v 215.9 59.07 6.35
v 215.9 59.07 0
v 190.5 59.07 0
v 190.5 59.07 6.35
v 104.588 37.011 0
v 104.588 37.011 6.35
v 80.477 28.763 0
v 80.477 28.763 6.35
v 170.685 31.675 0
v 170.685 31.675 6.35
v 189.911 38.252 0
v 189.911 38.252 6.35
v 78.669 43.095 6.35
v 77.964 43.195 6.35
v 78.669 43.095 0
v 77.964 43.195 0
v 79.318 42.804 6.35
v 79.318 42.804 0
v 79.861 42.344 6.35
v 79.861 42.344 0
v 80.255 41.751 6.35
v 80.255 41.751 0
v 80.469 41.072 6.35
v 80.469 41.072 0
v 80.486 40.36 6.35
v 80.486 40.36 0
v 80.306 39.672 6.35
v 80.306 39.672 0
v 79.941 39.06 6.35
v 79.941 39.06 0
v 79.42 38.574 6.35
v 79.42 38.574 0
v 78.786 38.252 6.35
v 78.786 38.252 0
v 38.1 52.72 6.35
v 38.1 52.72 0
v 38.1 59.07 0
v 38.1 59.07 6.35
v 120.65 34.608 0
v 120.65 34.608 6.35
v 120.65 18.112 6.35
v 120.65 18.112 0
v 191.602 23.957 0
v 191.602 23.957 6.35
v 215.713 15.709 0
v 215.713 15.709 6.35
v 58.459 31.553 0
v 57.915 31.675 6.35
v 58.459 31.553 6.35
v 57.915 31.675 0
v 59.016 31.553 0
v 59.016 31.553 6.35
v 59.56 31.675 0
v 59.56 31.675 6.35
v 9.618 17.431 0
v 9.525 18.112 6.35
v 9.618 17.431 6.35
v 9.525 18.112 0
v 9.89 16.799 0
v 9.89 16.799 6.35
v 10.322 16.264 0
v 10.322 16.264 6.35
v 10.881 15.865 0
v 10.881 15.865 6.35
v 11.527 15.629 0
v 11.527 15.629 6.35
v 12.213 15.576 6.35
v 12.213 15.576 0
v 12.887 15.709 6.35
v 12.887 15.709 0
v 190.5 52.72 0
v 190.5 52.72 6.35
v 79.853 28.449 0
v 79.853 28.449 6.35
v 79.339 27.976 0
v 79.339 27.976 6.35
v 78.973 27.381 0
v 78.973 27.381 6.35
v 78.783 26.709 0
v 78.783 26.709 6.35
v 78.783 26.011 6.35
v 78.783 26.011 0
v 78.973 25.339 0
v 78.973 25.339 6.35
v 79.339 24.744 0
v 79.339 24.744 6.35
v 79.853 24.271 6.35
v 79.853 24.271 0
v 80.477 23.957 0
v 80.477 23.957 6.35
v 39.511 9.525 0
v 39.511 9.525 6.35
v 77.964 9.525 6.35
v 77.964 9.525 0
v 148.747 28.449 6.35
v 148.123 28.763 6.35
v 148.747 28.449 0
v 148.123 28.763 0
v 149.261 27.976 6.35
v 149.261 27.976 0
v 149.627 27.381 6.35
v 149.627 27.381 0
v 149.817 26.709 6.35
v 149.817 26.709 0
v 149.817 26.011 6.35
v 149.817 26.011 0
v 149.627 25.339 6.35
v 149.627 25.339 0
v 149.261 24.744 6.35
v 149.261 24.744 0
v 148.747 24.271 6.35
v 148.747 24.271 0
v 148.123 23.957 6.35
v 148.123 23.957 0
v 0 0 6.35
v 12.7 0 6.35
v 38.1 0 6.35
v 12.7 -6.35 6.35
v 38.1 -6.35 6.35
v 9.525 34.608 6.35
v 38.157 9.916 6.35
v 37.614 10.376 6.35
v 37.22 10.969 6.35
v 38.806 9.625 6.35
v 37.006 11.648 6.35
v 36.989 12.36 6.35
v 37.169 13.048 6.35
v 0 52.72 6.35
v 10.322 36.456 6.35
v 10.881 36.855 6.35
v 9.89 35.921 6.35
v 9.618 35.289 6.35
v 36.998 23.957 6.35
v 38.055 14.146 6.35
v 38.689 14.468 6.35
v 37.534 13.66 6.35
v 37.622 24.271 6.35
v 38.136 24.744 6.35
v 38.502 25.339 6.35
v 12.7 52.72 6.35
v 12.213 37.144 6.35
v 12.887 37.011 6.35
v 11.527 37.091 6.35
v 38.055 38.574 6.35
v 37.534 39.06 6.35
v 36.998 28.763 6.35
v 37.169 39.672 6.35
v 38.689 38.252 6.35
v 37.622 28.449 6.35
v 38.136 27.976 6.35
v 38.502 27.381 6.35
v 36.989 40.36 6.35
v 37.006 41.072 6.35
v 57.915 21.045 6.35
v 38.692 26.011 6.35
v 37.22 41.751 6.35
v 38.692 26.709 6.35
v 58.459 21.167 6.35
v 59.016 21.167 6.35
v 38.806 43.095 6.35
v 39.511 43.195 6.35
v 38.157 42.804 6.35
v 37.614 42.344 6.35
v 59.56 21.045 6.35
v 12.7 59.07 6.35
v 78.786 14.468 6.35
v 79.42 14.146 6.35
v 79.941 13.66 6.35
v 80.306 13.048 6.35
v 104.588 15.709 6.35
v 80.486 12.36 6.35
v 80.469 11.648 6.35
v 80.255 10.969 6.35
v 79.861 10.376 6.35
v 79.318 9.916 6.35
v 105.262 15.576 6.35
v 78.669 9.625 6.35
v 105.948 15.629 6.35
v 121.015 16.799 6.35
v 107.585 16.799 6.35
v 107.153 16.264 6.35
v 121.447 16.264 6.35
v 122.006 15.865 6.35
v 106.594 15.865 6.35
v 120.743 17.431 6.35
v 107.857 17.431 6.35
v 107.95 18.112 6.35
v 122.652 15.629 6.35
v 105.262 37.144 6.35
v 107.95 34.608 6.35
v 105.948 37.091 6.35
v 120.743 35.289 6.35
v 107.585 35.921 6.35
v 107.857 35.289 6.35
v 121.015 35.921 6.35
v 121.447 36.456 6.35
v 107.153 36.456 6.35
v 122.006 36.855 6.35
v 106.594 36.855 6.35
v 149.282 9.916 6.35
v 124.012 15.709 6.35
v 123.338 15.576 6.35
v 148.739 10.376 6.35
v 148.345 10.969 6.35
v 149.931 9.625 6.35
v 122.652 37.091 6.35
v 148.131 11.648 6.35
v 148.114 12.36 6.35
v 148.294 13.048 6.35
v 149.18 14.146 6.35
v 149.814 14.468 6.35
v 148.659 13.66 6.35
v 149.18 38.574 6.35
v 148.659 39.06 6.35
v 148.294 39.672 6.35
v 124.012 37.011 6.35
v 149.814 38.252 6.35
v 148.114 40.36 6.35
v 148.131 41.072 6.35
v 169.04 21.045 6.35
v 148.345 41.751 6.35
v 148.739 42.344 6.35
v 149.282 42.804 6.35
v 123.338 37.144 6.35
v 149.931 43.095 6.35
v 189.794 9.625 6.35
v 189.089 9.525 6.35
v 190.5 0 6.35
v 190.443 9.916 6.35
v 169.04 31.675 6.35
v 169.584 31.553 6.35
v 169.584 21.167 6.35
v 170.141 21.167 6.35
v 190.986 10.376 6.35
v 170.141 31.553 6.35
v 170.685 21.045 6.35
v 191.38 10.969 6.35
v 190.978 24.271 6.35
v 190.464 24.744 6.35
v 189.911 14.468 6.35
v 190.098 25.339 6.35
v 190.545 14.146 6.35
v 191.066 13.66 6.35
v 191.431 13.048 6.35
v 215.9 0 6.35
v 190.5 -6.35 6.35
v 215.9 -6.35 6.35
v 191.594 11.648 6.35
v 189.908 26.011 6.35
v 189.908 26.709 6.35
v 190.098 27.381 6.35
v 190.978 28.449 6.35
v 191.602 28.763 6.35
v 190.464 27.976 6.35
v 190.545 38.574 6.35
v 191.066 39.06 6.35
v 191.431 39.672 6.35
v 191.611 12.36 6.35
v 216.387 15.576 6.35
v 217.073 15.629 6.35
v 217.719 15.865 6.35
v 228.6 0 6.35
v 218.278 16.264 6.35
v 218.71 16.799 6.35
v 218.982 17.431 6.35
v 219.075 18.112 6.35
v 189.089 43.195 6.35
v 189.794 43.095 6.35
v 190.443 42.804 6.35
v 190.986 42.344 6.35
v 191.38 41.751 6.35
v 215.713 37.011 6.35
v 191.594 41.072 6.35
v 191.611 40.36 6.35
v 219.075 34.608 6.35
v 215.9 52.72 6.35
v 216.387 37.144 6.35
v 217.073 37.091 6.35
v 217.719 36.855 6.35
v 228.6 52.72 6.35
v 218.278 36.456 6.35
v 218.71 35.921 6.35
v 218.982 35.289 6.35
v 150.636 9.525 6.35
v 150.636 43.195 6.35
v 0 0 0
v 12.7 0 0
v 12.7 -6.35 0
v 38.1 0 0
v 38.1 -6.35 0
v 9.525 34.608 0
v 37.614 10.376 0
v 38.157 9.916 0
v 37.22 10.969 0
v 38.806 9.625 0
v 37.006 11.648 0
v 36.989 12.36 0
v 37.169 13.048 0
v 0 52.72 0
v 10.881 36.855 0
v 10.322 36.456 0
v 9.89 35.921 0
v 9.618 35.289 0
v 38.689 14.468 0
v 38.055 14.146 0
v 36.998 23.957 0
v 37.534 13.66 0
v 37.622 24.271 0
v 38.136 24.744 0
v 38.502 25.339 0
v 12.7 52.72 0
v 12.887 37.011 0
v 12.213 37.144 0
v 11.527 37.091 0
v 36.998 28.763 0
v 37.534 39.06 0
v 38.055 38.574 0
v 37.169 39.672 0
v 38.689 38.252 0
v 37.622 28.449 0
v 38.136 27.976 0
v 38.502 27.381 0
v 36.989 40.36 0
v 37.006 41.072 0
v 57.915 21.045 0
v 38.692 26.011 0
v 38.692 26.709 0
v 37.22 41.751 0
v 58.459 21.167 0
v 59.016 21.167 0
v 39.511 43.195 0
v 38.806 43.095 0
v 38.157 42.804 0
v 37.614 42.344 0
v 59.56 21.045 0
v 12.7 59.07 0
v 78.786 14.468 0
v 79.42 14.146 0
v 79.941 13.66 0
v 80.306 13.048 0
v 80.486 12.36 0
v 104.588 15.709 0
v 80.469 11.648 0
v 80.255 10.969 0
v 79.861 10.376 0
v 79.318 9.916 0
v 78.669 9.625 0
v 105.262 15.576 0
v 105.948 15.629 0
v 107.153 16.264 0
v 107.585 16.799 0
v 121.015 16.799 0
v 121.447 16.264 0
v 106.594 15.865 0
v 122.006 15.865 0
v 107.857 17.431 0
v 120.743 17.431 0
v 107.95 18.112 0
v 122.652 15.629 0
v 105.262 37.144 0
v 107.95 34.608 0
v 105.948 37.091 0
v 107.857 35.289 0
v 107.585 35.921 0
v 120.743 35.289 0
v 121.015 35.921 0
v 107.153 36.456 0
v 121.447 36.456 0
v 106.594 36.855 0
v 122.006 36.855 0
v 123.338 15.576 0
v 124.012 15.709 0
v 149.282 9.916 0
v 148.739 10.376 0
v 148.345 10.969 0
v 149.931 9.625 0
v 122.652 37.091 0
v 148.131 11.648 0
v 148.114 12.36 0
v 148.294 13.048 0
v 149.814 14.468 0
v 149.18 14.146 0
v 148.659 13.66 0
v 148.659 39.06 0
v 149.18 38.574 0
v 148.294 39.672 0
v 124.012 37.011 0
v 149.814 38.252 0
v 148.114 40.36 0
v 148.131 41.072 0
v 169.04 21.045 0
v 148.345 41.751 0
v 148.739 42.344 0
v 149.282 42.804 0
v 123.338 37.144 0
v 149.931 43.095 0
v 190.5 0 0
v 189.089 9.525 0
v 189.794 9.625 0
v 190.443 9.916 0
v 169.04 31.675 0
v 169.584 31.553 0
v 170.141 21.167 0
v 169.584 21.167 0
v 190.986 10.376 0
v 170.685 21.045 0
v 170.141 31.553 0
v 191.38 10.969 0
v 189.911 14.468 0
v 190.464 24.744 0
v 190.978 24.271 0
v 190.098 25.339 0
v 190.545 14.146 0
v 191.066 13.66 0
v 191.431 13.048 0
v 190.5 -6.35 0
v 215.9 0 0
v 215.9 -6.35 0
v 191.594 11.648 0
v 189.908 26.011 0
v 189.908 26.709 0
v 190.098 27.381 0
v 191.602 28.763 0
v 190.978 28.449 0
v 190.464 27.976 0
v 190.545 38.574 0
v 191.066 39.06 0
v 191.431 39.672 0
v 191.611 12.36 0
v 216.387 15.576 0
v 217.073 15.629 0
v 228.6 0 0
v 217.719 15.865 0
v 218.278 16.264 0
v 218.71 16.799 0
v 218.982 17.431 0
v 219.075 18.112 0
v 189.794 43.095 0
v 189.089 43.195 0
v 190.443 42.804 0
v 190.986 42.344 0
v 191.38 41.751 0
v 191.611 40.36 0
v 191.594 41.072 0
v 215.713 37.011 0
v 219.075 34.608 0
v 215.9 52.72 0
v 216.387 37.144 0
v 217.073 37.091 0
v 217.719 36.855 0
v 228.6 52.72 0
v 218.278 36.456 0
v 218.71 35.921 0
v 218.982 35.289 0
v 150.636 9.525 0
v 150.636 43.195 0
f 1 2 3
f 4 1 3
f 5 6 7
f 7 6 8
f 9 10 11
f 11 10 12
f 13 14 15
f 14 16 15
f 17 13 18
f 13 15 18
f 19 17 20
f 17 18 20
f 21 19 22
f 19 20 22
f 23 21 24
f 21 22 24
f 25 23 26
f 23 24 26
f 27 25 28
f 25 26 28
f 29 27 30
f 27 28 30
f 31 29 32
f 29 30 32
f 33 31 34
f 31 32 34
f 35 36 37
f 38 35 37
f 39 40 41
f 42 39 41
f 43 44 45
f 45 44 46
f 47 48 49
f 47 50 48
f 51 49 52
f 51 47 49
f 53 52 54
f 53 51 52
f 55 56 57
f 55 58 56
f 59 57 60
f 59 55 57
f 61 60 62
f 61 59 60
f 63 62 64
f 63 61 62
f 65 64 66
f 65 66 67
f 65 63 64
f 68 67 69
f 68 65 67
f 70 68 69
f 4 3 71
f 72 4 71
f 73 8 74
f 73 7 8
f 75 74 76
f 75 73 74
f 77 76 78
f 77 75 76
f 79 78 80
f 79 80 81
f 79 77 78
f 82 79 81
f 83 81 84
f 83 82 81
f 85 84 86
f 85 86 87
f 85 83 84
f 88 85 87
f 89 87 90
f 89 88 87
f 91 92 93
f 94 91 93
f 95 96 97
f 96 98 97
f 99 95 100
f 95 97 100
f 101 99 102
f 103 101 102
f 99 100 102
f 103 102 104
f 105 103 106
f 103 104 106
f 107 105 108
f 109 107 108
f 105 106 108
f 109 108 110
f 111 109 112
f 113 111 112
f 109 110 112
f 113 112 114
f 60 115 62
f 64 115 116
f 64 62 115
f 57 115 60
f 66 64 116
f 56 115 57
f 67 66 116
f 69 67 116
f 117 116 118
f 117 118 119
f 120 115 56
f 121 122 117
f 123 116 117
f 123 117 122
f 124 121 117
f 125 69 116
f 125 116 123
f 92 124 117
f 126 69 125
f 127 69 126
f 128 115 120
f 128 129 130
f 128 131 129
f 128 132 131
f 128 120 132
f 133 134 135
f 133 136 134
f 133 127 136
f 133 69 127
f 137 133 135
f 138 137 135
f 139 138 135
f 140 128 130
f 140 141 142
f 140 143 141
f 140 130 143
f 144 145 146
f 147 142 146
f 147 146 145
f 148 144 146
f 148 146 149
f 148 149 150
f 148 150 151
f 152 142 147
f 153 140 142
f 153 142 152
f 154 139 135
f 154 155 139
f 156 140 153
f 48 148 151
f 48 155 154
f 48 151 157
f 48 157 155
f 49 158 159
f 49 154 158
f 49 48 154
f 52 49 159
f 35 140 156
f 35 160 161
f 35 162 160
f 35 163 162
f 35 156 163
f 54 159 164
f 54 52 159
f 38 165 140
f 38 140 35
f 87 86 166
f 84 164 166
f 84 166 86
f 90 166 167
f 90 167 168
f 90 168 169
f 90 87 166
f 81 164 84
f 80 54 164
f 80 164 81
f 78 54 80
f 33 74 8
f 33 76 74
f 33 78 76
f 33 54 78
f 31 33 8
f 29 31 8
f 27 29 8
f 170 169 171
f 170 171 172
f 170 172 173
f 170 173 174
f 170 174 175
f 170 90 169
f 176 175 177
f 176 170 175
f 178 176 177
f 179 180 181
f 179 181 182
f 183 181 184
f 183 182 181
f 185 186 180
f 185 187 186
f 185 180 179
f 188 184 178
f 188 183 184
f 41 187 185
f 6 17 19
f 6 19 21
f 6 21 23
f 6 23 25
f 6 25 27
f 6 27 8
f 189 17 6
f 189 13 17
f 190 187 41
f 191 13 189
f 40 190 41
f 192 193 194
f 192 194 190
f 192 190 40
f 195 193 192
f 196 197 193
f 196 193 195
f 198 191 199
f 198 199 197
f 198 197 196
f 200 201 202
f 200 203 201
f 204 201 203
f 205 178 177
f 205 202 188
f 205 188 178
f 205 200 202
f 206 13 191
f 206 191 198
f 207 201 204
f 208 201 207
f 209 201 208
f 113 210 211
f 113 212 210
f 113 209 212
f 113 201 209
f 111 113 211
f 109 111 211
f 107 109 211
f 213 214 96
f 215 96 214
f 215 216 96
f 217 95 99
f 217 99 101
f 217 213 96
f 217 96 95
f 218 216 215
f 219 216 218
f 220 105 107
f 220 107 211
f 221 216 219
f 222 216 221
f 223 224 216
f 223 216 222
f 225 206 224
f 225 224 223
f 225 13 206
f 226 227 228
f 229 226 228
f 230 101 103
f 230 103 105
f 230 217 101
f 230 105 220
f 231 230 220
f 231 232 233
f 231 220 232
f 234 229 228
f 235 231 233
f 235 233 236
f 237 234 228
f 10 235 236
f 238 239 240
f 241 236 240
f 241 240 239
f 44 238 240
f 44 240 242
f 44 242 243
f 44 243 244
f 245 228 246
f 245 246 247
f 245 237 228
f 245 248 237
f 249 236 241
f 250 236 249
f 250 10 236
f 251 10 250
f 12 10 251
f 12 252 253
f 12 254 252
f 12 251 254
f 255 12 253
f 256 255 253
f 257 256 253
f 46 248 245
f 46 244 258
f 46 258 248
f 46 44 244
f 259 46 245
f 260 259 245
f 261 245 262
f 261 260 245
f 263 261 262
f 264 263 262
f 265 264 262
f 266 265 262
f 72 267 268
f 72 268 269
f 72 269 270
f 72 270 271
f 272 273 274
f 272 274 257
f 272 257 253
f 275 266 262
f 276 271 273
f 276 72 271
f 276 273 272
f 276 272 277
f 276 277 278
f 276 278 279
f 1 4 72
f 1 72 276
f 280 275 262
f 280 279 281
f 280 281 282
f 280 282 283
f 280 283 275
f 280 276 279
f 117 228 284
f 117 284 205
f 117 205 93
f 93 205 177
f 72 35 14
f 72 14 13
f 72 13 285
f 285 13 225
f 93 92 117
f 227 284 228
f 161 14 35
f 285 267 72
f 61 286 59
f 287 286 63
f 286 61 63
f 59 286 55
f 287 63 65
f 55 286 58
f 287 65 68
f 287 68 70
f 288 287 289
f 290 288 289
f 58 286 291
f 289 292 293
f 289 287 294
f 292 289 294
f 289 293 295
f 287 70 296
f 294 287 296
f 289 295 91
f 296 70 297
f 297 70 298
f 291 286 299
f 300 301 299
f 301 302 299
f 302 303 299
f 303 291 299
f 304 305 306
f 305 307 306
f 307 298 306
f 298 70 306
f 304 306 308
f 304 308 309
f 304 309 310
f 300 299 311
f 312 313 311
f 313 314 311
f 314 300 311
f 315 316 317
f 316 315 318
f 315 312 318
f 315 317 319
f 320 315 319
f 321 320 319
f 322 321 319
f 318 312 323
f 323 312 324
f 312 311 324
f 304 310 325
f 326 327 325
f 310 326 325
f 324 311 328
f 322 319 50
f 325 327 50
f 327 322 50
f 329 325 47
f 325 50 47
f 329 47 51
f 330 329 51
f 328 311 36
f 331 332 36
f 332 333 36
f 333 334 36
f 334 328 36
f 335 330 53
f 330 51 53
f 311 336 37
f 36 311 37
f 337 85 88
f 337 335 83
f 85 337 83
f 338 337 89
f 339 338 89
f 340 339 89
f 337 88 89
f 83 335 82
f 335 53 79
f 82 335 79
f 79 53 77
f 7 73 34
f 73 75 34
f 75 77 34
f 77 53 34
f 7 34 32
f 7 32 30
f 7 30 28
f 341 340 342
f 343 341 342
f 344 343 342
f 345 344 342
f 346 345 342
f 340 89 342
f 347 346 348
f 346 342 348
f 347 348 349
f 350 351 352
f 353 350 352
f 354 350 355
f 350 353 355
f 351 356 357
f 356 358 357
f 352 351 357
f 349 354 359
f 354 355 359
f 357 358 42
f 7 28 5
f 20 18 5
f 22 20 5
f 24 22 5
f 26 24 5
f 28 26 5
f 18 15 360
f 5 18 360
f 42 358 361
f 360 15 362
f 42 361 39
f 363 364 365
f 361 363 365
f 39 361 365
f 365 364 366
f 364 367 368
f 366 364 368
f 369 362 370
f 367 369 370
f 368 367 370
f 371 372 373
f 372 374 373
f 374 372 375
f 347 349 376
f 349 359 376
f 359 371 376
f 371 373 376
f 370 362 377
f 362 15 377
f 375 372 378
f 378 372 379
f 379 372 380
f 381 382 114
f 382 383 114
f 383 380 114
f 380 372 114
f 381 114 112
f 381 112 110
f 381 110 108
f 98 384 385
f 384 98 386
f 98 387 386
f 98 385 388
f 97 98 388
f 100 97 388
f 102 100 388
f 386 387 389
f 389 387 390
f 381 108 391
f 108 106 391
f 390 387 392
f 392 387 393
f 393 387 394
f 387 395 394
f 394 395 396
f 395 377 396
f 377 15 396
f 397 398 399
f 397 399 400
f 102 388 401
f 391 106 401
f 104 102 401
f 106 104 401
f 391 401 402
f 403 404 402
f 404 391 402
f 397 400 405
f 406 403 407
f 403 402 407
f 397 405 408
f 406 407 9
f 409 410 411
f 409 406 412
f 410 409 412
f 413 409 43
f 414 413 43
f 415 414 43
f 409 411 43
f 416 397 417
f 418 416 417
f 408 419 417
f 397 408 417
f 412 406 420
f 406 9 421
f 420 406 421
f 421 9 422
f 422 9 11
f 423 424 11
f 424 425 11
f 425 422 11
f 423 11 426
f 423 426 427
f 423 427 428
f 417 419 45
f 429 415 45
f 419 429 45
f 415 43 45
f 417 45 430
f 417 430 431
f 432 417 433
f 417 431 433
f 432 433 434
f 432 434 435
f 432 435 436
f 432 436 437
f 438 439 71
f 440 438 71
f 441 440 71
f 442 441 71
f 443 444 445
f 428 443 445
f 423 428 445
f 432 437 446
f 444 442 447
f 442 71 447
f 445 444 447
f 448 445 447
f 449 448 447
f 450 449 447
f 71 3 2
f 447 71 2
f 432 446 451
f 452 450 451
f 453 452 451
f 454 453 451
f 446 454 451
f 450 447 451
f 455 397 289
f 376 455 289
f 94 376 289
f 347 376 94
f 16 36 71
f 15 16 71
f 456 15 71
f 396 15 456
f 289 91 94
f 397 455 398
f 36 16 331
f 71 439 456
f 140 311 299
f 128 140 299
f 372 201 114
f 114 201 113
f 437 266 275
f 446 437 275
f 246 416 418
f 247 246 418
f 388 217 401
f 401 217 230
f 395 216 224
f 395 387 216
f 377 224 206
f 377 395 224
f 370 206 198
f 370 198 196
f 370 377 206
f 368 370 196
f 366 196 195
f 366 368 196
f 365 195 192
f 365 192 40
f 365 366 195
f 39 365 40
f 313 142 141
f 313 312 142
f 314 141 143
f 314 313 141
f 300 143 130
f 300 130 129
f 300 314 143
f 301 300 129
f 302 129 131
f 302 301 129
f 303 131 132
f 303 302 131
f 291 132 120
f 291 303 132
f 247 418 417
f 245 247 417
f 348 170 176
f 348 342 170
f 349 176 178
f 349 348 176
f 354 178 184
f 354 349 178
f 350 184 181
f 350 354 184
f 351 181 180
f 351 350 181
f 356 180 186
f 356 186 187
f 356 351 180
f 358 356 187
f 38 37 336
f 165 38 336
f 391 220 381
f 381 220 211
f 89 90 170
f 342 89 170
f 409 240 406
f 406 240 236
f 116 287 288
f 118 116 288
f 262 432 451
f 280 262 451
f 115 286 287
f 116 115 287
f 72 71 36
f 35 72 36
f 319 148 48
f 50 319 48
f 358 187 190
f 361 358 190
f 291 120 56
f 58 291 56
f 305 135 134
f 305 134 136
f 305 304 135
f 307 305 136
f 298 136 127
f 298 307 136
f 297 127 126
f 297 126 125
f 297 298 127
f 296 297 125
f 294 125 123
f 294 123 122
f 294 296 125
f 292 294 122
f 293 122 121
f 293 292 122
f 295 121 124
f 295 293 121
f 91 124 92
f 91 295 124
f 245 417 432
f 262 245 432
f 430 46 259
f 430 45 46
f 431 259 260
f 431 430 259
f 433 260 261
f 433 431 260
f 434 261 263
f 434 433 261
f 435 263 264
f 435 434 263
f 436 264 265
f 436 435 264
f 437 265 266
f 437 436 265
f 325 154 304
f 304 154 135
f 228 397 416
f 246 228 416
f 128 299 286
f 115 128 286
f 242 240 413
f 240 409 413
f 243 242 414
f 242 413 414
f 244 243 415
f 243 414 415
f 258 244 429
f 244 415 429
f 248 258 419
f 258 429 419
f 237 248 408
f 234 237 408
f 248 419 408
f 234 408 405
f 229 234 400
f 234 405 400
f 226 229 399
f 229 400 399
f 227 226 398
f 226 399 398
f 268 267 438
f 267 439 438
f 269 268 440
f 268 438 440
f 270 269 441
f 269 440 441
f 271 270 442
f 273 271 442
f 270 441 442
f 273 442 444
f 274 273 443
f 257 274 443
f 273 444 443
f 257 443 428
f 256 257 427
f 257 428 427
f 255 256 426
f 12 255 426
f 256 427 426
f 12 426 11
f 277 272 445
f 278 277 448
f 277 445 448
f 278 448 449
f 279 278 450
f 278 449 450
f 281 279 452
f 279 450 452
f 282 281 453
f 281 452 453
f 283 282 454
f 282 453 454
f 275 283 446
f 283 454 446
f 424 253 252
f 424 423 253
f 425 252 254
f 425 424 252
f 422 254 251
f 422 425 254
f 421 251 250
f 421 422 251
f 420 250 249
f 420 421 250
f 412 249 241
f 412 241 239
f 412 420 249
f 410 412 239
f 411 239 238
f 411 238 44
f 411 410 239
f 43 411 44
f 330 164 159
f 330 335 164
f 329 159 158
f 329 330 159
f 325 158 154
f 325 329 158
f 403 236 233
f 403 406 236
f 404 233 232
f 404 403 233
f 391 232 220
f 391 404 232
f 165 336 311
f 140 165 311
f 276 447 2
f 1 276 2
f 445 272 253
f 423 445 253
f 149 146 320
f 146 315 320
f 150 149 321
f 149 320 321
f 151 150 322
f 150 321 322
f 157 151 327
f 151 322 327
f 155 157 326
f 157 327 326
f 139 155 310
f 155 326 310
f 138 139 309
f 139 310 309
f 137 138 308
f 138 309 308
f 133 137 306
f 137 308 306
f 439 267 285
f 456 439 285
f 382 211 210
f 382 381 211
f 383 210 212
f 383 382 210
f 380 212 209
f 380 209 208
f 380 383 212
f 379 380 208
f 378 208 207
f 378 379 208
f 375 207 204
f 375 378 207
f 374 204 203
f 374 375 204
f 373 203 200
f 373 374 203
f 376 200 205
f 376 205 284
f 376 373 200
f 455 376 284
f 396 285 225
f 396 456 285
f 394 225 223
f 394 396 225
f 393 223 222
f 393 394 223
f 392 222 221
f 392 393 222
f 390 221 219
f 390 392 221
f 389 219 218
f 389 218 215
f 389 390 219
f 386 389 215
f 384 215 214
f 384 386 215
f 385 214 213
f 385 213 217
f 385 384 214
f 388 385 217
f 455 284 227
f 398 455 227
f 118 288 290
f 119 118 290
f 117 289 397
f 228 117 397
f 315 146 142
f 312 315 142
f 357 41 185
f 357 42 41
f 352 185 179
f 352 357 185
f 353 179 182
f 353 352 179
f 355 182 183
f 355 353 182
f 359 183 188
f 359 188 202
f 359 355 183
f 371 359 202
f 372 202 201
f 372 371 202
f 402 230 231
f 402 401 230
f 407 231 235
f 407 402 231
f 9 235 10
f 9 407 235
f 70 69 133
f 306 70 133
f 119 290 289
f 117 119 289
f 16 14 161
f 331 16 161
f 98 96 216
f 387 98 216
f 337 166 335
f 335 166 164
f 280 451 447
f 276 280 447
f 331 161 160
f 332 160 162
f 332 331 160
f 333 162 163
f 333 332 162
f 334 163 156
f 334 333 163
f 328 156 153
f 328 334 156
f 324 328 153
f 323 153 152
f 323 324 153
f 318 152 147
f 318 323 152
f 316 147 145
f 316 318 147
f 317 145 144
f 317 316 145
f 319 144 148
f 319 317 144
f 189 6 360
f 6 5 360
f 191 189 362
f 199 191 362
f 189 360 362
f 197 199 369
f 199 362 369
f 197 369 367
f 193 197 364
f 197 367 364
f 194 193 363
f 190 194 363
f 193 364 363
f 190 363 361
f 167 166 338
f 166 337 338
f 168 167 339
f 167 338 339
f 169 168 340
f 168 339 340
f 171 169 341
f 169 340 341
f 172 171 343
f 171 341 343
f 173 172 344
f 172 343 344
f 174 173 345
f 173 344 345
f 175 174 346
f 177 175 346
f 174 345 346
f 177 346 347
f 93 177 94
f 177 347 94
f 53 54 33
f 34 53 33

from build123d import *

# Parameters (mm, degrees)
BOSS_EXTRUDE1_DEPTH = 6.35
CUT_EXTRUDE1_DEPTH  = 237.19387672
FILLET1_R           = 2.54


with BuildPart() as part:
    # Sketch1 → Boss-Extrude1 (new body)
    with BuildSketch(Plane.XY):
        Polygon((0, 0), (12.7, 0), (12.7, -6.35), (38.1, -6.35), (38.1, 0), (190.5, 0), (190.5, -6.35), (215.9, -6.35), (215.9, 0), (228.6, 0), (228.6, 52.72), (215.9, 52.72), (215.9, 59.07), (190.5, 59.07), (190.5, 52.72), (38.1, 52.72), (38.1, 59.07), (12.7, 59.07), (12.7, 52.72), (0, 52.72), align=None)
    extrude(amount=BOSS_EXTRUDE1_DEPTH)

    # Sketch2 → Cut-Extrude1 (cut, through all)
    with BuildSketch(Plane.XY.offset(6.35)):
        Polygon((44.023573871, 26.36), (9.525, 38.161544143), (9.525, 14.558455857), align=None)
        Polygon((93.236073871, 43.195), (24.238926129, 43.195), (58.7375, 31.393455857), align=None)
        Polygon((107.95, 38.161544143), (73.451426129, 26.36), (107.95, 14.558455857), align=None)
        Polygon((93.236073871, 9.525), (58.7375, 21.326544143), (24.238926129, 9.525), align=None)
        Polygon((155.148573871, 26.36), (120.65, 38.161544143), (120.65, 14.558455857), align=None)
        Polygon((204.361073871, 43.195), (135.363926129, 43.195), (169.8625, 31.393455857), align=None)
        Polygon((219.075, 38.161544143), (184.576426129, 26.36), (219.075, 14.558455857), align=None)
        Polygon((204.361073871, 9.525), (169.8625, 21.326544143), (135.363926129, 9.525), align=None)
    extrude(amount=-CUT_EXTRUDE1_DEPTH, mode=Mode.SUBTRACT)

    # Fillet1
    fillet1_edges = [part.edges().sort_by_distance(p)[0] for p in [
        (73.451426129, 26.36, 3.175),
        (107.95, 38.161544143, 3.175),
        (107.95, 14.558455857, 3.175),
        (204.361073871, 9.525, 3.175),
        (135.363926129, 9.525, 3.175),
        (169.8625, 21.326544143, 3.175),
        (169.8625, 31.393455857, 3.175),
        (135.363926129, 43.195, 3.175),
        (204.361073871, 43.195, 3.175),
        (219.075, 14.558455857, 3.175),
        (184.576426129, 26.36, 3.175),
        (219.075, 38.161544143, 3.175),
        (9.525, 14.558455857, 3.175),
        (9.525, 38.161544143, 3.175),
        (44.023573871, 26.36, 3.175),
        (155.148573871, 26.36, 3.175),
        (120.65, 14.558455857, 3.175),
        (120.65, 38.161544143, 3.175),
        (24.238926129, 9.525, 3.175),
        (58.7375, 21.326544143, 3.175),
        (93.236073871, 9.525, 3.175),
        (58.7375, 31.393455857, 3.175),
        (24.238926129, 43.195, 3.175),
        (93.236073871, 43.195, 3.175),
    ]]
    fillet(fillet1_edges, radius=FILLET1_R)


solid = part.part
